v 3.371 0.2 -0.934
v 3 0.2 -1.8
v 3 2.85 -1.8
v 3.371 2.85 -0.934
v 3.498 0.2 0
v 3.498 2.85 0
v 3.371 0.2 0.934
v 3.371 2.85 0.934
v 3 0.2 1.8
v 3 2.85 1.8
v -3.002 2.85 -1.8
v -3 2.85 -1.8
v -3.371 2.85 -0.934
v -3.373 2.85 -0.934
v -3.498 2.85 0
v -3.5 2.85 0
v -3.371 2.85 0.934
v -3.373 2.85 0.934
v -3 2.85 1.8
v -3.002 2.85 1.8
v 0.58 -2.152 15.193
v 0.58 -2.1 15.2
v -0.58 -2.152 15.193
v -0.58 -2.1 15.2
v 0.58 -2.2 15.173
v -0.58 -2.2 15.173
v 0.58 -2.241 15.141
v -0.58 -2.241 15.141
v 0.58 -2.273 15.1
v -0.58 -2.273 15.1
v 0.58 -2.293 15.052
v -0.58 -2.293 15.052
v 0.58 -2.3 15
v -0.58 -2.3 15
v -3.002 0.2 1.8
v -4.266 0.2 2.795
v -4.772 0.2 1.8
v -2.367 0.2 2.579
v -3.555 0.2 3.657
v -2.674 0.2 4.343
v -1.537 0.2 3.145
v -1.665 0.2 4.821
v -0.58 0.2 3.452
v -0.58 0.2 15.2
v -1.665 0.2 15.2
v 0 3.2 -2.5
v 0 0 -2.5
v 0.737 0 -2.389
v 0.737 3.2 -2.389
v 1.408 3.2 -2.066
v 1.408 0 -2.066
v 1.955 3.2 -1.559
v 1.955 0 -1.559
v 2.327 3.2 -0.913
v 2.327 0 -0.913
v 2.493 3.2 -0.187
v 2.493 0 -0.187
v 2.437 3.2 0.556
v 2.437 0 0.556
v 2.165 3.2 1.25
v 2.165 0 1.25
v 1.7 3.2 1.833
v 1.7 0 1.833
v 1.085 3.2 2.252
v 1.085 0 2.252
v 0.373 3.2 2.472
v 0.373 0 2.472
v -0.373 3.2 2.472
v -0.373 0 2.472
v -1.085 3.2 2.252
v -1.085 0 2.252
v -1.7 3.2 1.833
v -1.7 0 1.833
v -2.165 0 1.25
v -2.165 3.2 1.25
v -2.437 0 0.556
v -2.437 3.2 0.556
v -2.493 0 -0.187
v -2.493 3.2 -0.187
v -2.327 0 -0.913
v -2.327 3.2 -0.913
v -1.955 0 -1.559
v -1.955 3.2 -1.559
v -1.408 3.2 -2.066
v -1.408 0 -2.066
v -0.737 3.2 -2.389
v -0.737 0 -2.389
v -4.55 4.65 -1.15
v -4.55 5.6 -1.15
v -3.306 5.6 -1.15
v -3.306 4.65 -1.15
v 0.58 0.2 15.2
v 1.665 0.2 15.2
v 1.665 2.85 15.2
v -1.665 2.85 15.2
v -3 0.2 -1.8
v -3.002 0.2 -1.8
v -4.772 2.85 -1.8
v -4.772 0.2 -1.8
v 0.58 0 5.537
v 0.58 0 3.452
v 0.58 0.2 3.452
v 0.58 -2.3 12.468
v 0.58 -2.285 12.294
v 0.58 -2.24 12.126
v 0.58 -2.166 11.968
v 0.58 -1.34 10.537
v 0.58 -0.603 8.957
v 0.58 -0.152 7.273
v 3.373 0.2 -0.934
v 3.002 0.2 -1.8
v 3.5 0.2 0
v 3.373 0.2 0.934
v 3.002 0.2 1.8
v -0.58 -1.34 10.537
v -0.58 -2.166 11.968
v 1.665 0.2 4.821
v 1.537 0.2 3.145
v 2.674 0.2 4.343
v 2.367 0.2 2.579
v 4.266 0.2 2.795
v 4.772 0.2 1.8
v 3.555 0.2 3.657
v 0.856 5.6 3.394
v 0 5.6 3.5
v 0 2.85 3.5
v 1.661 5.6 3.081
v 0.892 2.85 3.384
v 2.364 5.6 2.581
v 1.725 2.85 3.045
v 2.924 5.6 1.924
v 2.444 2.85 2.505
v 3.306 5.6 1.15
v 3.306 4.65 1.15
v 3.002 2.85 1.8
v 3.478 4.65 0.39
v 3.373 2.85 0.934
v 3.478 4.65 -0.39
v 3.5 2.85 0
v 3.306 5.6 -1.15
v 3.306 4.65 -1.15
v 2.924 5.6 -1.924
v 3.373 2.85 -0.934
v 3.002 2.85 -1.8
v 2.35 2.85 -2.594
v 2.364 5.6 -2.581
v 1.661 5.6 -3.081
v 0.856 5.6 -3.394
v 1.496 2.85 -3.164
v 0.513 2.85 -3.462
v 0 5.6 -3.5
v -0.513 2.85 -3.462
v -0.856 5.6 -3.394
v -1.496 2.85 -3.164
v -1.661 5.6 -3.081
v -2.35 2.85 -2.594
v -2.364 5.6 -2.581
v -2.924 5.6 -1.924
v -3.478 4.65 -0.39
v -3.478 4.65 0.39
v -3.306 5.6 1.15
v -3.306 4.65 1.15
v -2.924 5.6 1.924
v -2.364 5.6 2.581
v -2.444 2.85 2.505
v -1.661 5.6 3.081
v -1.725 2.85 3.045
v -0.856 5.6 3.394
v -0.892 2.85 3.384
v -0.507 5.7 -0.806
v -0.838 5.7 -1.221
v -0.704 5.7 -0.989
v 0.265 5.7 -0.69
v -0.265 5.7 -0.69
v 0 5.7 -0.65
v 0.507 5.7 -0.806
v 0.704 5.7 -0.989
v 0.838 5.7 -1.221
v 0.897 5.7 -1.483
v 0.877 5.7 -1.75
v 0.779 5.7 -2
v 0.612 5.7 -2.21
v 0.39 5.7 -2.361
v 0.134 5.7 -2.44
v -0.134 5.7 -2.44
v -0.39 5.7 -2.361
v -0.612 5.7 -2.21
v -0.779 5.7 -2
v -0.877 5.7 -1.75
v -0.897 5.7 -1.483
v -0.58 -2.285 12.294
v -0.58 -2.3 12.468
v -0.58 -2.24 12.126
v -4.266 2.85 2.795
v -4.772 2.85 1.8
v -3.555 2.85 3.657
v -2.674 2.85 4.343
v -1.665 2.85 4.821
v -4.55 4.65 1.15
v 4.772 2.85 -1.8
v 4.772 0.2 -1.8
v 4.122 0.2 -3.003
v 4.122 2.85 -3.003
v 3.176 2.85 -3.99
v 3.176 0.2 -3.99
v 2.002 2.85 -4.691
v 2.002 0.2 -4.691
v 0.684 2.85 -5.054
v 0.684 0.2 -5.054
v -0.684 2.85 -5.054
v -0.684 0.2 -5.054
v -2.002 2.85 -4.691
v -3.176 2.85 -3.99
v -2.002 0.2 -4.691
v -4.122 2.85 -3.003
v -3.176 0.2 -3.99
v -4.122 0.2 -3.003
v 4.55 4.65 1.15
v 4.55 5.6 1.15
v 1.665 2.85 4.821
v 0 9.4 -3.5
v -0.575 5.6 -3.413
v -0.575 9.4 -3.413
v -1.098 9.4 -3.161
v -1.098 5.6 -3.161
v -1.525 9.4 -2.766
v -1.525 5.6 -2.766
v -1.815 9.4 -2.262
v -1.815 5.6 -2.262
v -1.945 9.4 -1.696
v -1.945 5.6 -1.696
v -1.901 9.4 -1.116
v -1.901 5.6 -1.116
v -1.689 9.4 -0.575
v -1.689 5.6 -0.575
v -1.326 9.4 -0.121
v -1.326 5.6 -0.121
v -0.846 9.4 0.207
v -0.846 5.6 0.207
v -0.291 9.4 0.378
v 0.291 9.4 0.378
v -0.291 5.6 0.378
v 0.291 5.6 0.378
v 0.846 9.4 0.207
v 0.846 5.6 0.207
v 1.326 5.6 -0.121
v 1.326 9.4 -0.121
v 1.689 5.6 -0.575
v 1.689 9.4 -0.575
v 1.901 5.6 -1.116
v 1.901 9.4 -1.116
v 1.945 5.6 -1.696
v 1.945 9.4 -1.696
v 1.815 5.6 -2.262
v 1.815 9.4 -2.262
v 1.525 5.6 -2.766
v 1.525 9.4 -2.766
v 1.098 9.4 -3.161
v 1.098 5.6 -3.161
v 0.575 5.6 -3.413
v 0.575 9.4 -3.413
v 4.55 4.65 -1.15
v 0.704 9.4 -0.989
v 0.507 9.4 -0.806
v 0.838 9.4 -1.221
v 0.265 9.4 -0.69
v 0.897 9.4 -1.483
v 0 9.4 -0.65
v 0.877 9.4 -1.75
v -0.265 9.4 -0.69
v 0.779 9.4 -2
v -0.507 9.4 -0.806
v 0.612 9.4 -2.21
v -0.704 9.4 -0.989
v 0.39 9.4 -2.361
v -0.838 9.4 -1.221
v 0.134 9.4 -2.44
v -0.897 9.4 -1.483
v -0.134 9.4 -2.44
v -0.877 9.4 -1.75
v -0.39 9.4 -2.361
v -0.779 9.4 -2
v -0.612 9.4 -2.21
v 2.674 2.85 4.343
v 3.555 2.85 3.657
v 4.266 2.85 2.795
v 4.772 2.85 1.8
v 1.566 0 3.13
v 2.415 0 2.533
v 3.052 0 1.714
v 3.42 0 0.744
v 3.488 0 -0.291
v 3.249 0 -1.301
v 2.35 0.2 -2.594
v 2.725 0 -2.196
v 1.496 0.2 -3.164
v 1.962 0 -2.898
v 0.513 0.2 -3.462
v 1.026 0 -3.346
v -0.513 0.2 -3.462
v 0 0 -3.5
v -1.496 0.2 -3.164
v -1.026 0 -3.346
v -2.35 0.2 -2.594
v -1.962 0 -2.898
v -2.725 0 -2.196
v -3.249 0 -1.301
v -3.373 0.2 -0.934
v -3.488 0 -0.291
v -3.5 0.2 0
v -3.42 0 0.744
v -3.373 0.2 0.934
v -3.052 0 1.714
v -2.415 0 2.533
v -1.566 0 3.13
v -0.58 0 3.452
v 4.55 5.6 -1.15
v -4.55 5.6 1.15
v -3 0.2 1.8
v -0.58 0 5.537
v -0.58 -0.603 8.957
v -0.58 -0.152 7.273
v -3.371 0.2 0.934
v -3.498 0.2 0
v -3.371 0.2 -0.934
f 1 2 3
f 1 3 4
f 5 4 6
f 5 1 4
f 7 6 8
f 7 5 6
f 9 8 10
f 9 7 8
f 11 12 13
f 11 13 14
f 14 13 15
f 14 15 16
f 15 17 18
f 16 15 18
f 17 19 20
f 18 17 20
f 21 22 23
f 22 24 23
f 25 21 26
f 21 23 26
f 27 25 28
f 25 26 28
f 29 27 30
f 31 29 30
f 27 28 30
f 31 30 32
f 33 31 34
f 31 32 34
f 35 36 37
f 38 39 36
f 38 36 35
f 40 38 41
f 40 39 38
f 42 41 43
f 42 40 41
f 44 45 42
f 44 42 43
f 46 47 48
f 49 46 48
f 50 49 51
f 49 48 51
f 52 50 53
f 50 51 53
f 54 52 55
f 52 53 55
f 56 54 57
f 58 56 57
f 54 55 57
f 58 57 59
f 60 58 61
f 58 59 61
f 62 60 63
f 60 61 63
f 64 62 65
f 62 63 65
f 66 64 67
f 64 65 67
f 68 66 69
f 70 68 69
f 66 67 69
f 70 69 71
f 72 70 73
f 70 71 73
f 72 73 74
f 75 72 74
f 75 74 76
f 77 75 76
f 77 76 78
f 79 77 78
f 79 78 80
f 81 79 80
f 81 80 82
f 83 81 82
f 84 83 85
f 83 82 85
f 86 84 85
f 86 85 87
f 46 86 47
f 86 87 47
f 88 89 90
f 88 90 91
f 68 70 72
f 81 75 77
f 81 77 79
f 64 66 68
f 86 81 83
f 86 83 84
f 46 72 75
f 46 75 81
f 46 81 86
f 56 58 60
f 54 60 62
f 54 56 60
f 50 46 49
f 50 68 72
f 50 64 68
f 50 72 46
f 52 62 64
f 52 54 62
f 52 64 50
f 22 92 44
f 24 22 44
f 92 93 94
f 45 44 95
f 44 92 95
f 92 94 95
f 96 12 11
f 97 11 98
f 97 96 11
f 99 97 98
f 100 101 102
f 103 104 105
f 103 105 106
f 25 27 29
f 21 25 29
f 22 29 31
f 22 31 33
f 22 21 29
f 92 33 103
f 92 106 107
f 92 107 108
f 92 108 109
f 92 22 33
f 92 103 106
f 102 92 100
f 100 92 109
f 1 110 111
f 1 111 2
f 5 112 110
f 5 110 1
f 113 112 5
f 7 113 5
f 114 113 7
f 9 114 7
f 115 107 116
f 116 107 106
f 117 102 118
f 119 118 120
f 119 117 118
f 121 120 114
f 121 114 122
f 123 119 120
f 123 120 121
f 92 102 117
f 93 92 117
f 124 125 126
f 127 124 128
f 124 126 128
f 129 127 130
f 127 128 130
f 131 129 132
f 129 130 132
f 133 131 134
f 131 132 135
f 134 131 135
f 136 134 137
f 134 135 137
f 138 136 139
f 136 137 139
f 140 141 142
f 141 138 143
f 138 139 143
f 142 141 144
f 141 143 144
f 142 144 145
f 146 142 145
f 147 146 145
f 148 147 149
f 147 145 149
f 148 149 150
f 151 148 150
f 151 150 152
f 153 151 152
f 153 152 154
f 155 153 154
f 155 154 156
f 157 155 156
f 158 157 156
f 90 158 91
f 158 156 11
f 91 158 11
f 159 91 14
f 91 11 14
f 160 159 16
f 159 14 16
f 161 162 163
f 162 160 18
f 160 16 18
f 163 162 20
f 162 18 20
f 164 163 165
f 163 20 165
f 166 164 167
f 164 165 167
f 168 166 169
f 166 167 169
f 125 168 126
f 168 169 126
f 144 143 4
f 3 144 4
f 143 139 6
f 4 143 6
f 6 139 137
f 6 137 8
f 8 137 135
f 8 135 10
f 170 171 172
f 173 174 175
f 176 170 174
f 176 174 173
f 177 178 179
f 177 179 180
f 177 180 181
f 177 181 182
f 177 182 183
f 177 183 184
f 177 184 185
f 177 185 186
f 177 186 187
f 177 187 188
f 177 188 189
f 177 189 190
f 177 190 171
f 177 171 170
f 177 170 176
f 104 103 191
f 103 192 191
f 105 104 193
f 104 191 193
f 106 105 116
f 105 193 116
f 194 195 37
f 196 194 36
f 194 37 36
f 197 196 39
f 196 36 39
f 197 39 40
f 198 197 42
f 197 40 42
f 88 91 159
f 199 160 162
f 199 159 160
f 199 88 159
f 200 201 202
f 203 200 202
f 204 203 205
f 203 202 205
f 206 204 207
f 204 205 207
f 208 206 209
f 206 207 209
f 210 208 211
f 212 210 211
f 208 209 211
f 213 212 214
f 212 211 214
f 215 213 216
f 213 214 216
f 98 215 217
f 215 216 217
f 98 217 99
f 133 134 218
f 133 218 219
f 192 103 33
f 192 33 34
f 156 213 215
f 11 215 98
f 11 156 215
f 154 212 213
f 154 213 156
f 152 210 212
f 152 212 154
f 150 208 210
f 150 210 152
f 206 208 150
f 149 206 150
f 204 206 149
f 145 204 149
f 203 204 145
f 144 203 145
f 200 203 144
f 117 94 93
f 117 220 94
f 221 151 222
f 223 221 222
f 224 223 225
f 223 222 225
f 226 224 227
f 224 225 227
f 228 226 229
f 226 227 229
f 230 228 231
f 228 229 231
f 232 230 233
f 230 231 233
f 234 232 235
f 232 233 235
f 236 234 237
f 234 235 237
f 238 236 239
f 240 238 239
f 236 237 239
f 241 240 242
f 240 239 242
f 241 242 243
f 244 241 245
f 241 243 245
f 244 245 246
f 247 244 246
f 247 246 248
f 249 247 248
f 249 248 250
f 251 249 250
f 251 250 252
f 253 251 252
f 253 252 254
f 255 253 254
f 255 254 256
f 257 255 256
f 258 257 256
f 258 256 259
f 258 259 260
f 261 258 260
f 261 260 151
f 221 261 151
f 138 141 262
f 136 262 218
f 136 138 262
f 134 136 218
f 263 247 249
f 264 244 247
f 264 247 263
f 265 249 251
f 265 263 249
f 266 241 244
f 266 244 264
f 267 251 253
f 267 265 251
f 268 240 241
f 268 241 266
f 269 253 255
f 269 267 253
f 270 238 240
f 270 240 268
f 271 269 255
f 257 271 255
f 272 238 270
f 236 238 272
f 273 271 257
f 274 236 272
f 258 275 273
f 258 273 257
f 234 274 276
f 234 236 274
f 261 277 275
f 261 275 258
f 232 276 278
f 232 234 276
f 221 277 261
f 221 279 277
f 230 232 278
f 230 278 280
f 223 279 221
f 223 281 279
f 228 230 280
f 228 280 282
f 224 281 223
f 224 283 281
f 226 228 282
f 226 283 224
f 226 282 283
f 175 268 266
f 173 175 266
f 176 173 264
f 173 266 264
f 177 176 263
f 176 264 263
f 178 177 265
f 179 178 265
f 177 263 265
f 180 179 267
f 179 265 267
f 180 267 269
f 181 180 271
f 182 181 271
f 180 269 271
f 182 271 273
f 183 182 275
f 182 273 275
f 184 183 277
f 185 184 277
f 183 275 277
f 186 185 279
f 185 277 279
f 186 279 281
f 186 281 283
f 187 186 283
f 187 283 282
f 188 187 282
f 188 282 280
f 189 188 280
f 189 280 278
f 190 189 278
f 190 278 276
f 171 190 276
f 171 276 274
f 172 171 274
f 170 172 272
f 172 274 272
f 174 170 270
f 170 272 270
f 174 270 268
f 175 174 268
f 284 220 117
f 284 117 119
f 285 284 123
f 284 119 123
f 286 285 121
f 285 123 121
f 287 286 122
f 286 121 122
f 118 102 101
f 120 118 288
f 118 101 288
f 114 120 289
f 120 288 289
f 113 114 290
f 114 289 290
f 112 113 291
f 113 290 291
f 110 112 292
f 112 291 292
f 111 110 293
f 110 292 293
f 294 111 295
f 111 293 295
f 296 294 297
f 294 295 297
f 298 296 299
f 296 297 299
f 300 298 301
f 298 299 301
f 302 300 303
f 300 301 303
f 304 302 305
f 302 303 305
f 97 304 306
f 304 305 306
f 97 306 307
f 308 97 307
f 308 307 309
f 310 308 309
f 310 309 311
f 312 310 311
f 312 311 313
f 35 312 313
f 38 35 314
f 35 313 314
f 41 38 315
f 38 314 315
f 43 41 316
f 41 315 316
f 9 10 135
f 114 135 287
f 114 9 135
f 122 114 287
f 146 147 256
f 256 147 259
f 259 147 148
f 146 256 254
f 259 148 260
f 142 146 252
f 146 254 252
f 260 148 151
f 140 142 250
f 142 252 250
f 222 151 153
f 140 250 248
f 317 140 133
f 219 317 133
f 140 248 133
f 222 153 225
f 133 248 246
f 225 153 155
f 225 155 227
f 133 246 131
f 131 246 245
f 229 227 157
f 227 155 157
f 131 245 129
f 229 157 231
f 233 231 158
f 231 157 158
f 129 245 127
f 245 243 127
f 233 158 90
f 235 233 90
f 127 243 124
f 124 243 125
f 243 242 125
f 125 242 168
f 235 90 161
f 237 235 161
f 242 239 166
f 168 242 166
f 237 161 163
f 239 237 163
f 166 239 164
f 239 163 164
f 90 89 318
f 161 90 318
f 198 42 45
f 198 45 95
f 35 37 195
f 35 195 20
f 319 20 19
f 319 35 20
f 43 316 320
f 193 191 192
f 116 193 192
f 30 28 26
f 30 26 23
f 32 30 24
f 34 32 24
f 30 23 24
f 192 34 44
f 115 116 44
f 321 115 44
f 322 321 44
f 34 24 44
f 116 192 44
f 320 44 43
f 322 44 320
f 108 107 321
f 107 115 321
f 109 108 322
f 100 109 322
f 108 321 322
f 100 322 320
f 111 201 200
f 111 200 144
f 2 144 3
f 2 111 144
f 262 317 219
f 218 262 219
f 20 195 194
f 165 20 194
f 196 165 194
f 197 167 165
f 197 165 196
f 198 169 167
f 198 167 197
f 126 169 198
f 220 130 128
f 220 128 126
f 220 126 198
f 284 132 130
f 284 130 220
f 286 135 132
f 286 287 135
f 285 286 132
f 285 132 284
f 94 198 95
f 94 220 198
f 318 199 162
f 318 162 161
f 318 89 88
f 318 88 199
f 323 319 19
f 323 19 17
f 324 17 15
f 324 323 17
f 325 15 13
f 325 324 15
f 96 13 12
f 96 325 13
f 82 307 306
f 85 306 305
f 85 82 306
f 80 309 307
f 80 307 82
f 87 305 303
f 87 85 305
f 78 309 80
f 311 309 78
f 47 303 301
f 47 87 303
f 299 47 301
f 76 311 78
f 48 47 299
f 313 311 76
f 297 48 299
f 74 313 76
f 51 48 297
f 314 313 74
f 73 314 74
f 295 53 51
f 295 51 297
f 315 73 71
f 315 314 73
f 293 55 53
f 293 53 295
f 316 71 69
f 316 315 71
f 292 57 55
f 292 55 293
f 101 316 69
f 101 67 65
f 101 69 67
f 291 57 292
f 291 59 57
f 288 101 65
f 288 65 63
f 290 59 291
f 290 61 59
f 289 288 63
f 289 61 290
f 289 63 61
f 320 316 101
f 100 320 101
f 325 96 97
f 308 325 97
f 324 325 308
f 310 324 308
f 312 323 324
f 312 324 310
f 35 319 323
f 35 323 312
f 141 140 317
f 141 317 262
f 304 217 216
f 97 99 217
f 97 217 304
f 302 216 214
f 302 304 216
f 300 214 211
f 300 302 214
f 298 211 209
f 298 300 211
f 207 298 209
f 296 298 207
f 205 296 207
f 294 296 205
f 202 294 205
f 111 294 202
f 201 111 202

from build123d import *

# Parameters (mm, degrees)
CROQUIS1_R                   = 5.1
SALIENTE_EXTRUIR2_DEPTH      = 2.85
CROQUIS4_R                   = 3.5
SALIENTE_EXTRUIR3_DEPTH      = 2.75
CROQUIS5_R                   = 1.95
SALIENTE_EXTRUIR4_DEPTH      = 3.8
SALIENTE_EXTRUIR5_DEPTH      = 15.2
CORTAR_EXTRUIR4_REACH        = 21.109
CROQUIS8_W                   = 1.085
CROQUIS8_H                   = 2.3
CORTAR_EXTRUIR6_DEPTH        = 10.2
REDONDEO1_R                  = 1
REDONDEO2_R                  = 10
CORTAR_EXTRUIR7_DEPTH        = 0.2
CROQUIS13_R                  = 2.5
CORTAR_EXTRUIR8_DEPTH        = 3.2
CROQUIS14_R                  = 0.9
CORTAR_EXTRUIR9_DEPTH        = 3.7
CORTAR_EXTRUIR10_DEPTH       = 2.65
REDONDEO3_R                  = 0.2
SALIENTE_EXTRUIR6_DEPTH      = 4.55
SALIENTE_EXTRUIR6_DEPTH_BACK = 4.55


with BuildPart() as part:
    # Croquis1 → Saliente-Extruir2 (new body)
    with BuildSketch(Plane(origin=(0, 0, 0), x_dir=(1, 0, 0), z_dir=(0, 1, 0))):
        with Locations(Location((0, 0, 0), (0, 0, 270))):
            Circle(CROQUIS1_R)
    extrude(amount=SALIENTE_EXTRUIR2_DEPTH)

    # Croquis4 → Saliente-Extruir3 (add)
    with BuildSketch(Plane(origin=(0, 2.85, 0), x_dir=(1, 0, 0), z_dir=(0, 1, 0))):
        with Locations(Location((0, 0, 0), (0, 0, 270))):
            Circle(CROQUIS4_R)
    extrude(amount=SALIENTE_EXTRUIR3_DEPTH)

    # Croquis5 → Saliente-Extruir4 (add)
    with BuildSketch(Plane(origin=(0, 5.6, 0), x_dir=(1, 0, 0), z_dir=(0, 1, 0))):
        with Locations(Location((0, 1.55, 0), (0, 0, 89.999128056))):
            Circle(CROQUIS5_R)
    extrude(amount=SALIENTE_EXTRUIR4_DEPTH)

    # Croquis7 → Saliente-Extruir5 (add)
    with BuildSketch(Plane.XY):
        Polygon((0, 2.85), (1.665, 2.85), (1.665, -2.3), (-1.665, -2.3), (-1.665, 2.85), align=None)
    extrude(amount=SALIENTE_EXTRUIR5_DEPTH)

    # Croquis11 → Cortar-Extruir4 (cut, up to next)
    with BuildSketch(Plane(origin=(1.665, 0, 0), x_dir=(0, 0, -1), z_dir=(1, 0, 0)), mode=Mode.PRIVATE) as cortar_extruir4_sk1:
        Polygon((-0.217533037, -2.3), (0, -2.3), (0, 0), (-4.82055754, 0), (-8.216283143, 0), (-12.2, -2.3), align=None)
    cortar_extruir4_tool1 = extrude(cortar_extruir4_sk1.sketch, amount=-CORTAR_EXTRUIR4_REACH, mode=Mode.PRIVATE) & part.part
    add(cortar_extruir4_tool1.solids().sort_by_distance((1.665, -1.224798, 5.168848))[0], mode=Mode.SUBTRACT)

    # Croquis8 → Cortar-Extruir6 (cut)
    with BuildSketch(Plane.XY.offset(15.2)):
        with Locations((-1.1225, -1.15)):
            Rectangle(CROQUIS8_W, CROQUIS8_H)
        with Locations((1.1225, -1.15)):
            Rectangle(CROQUIS8_W, CROQUIS8_H)
    extrude(amount=-CORTAR_EXTRUIR6_DEPTH, mode=Mode.SUBTRACT)

    # Redondeo1
    redondeo1_edges = [part.edges().sort_by_distance(p)[0] for p in [
        (0, -2.3, 12.2),
    ]]
    fillet(redondeo1_edges, radius=REDONDEO1_R)

    # Redondeo2
    redondeo2_edges = [part.edges().sort_by_distance(p)[0] for p in [
        (0, 0, 8.216283143),
    ]]
    fillet(redondeo2_edges, radius=REDONDEO2_R)

    # Croquis12 → Cortar-Extruir7 (cut)
    with BuildSketch(Plane.XZ):
        with BuildLine():
            Line((-0.58, 15.2), (-1.665, 15.2))
            Line((-1.665, 15.2), (-1.665, 4.82055754))
            ThreePointArc((-1.665, 4.82055754), (0, -5.1), (1.665, 4.82055754))
            Line((1.665, 4.82055754), (1.665, 15.2))
            Line((1.665, 15.2), (0.58, 15.2))
            Line((0.58, 15.2), (0.58, 5.536791218))
            Line((0.58, 5.536791218), (0.58, 3.451608321))
            ThreePointArc((0.58, 3.451608321), (0, -3.5), (-0.58, 3.451608321))
            Line((-0.58, 3.451608321), (-0.58, 5.536791218))
            Line((-0.58, 5.536791218), (-0.58, 15.2))
        make_face()
    extrude(amount=-CORTAR_EXTRUIR7_DEPTH, mode=Mode.SUBTRACT)

    # Croquis13 → Cortar-Extruir8 (cut)
    with BuildSketch(Plane.XZ):
        with Locations(Location((0, 0, 0), (0, 0, 270))):
            Circle(CROQUIS13_R)
    extrude(amount=-CORTAR_EXTRUIR8_DEPTH, mode=Mode.SUBTRACT)

    # Croquis14 → Cortar-Extruir9 (cut)
    with BuildSketch(Plane(origin=(0, 9.4, 0), x_dir=(1, 0, 0), z_dir=(0, 1, 0))):
        with Locations(Location((0, 1.55, 0), (0, 0, 270))):
            Circle(CROQUIS14_R)
    extrude(amount=-CORTAR_EXTRUIR9_DEPTH, mode=Mode.SUBTRACT)

    # Croquis15 → Cortar-Extruir10 (cut)
    with BuildSketch(Plane.XZ.offset(-0.2)):
        with BuildLine():
            Line((-4.771792116, 1.8), (-2.999613342, 1.8))
            ThreePointArc((-2.999613342, 1.8), (-3.498239586, 0), (-2.999613342, -1.8))
            Line((-2.999613342, -1.8), (-4.771792116, -1.8))
            ThreePointArc((-4.771792116, -1.8), (-5.1, 0), (-4.771792116, 1.8))
        make_face()
        with BuildLine():
            Line((4.771792116, -1.8), (2.999613342, -1.8))
            ThreePointArc((2.999613342, -1.8), (3.498239586, 0), (2.999613342, 1.8))
            Line((2.999613342, 1.8), (4.771792116, 1.8))
            ThreePointArc((4.771792116, 1.8), (5.1, 0), (4.771792116, -1.8))
        make_face()
    extrude(amount=-CORTAR_EXTRUIR10_DEPTH, mode=Mode.SUBTRACT)

    # Redondeo3
    redondeo3_edges = [part.edges().sort_by_distance(p)[0] for p in [
        (0, -2.3, 15.2),
    ]]
    fillet(redondeo3_edges, radius=REDONDEO3_R)

    # Croquis16 → Saliente-Extruir6 (add, two sides: drawn at the far end of the back side and taken through both)
    with BuildSketch(Plane(origin=(0, 0, 0), x_dir=(0, 0, -1), z_dir=(1, 0, 0)).offset(-SALIENTE_EXTRUIR6_DEPTH_BACK)):
        Polygon((0, 5.6), (1.15, 5.6), (1.15, 4.65), (-1.15, 4.65), (-1.15, 5.6), align=None)
    extrude(amount=SALIENTE_EXTRUIR6_DEPTH + SALIENTE_EXTRUIR6_DEPTH_BACK)


solid = part.part
